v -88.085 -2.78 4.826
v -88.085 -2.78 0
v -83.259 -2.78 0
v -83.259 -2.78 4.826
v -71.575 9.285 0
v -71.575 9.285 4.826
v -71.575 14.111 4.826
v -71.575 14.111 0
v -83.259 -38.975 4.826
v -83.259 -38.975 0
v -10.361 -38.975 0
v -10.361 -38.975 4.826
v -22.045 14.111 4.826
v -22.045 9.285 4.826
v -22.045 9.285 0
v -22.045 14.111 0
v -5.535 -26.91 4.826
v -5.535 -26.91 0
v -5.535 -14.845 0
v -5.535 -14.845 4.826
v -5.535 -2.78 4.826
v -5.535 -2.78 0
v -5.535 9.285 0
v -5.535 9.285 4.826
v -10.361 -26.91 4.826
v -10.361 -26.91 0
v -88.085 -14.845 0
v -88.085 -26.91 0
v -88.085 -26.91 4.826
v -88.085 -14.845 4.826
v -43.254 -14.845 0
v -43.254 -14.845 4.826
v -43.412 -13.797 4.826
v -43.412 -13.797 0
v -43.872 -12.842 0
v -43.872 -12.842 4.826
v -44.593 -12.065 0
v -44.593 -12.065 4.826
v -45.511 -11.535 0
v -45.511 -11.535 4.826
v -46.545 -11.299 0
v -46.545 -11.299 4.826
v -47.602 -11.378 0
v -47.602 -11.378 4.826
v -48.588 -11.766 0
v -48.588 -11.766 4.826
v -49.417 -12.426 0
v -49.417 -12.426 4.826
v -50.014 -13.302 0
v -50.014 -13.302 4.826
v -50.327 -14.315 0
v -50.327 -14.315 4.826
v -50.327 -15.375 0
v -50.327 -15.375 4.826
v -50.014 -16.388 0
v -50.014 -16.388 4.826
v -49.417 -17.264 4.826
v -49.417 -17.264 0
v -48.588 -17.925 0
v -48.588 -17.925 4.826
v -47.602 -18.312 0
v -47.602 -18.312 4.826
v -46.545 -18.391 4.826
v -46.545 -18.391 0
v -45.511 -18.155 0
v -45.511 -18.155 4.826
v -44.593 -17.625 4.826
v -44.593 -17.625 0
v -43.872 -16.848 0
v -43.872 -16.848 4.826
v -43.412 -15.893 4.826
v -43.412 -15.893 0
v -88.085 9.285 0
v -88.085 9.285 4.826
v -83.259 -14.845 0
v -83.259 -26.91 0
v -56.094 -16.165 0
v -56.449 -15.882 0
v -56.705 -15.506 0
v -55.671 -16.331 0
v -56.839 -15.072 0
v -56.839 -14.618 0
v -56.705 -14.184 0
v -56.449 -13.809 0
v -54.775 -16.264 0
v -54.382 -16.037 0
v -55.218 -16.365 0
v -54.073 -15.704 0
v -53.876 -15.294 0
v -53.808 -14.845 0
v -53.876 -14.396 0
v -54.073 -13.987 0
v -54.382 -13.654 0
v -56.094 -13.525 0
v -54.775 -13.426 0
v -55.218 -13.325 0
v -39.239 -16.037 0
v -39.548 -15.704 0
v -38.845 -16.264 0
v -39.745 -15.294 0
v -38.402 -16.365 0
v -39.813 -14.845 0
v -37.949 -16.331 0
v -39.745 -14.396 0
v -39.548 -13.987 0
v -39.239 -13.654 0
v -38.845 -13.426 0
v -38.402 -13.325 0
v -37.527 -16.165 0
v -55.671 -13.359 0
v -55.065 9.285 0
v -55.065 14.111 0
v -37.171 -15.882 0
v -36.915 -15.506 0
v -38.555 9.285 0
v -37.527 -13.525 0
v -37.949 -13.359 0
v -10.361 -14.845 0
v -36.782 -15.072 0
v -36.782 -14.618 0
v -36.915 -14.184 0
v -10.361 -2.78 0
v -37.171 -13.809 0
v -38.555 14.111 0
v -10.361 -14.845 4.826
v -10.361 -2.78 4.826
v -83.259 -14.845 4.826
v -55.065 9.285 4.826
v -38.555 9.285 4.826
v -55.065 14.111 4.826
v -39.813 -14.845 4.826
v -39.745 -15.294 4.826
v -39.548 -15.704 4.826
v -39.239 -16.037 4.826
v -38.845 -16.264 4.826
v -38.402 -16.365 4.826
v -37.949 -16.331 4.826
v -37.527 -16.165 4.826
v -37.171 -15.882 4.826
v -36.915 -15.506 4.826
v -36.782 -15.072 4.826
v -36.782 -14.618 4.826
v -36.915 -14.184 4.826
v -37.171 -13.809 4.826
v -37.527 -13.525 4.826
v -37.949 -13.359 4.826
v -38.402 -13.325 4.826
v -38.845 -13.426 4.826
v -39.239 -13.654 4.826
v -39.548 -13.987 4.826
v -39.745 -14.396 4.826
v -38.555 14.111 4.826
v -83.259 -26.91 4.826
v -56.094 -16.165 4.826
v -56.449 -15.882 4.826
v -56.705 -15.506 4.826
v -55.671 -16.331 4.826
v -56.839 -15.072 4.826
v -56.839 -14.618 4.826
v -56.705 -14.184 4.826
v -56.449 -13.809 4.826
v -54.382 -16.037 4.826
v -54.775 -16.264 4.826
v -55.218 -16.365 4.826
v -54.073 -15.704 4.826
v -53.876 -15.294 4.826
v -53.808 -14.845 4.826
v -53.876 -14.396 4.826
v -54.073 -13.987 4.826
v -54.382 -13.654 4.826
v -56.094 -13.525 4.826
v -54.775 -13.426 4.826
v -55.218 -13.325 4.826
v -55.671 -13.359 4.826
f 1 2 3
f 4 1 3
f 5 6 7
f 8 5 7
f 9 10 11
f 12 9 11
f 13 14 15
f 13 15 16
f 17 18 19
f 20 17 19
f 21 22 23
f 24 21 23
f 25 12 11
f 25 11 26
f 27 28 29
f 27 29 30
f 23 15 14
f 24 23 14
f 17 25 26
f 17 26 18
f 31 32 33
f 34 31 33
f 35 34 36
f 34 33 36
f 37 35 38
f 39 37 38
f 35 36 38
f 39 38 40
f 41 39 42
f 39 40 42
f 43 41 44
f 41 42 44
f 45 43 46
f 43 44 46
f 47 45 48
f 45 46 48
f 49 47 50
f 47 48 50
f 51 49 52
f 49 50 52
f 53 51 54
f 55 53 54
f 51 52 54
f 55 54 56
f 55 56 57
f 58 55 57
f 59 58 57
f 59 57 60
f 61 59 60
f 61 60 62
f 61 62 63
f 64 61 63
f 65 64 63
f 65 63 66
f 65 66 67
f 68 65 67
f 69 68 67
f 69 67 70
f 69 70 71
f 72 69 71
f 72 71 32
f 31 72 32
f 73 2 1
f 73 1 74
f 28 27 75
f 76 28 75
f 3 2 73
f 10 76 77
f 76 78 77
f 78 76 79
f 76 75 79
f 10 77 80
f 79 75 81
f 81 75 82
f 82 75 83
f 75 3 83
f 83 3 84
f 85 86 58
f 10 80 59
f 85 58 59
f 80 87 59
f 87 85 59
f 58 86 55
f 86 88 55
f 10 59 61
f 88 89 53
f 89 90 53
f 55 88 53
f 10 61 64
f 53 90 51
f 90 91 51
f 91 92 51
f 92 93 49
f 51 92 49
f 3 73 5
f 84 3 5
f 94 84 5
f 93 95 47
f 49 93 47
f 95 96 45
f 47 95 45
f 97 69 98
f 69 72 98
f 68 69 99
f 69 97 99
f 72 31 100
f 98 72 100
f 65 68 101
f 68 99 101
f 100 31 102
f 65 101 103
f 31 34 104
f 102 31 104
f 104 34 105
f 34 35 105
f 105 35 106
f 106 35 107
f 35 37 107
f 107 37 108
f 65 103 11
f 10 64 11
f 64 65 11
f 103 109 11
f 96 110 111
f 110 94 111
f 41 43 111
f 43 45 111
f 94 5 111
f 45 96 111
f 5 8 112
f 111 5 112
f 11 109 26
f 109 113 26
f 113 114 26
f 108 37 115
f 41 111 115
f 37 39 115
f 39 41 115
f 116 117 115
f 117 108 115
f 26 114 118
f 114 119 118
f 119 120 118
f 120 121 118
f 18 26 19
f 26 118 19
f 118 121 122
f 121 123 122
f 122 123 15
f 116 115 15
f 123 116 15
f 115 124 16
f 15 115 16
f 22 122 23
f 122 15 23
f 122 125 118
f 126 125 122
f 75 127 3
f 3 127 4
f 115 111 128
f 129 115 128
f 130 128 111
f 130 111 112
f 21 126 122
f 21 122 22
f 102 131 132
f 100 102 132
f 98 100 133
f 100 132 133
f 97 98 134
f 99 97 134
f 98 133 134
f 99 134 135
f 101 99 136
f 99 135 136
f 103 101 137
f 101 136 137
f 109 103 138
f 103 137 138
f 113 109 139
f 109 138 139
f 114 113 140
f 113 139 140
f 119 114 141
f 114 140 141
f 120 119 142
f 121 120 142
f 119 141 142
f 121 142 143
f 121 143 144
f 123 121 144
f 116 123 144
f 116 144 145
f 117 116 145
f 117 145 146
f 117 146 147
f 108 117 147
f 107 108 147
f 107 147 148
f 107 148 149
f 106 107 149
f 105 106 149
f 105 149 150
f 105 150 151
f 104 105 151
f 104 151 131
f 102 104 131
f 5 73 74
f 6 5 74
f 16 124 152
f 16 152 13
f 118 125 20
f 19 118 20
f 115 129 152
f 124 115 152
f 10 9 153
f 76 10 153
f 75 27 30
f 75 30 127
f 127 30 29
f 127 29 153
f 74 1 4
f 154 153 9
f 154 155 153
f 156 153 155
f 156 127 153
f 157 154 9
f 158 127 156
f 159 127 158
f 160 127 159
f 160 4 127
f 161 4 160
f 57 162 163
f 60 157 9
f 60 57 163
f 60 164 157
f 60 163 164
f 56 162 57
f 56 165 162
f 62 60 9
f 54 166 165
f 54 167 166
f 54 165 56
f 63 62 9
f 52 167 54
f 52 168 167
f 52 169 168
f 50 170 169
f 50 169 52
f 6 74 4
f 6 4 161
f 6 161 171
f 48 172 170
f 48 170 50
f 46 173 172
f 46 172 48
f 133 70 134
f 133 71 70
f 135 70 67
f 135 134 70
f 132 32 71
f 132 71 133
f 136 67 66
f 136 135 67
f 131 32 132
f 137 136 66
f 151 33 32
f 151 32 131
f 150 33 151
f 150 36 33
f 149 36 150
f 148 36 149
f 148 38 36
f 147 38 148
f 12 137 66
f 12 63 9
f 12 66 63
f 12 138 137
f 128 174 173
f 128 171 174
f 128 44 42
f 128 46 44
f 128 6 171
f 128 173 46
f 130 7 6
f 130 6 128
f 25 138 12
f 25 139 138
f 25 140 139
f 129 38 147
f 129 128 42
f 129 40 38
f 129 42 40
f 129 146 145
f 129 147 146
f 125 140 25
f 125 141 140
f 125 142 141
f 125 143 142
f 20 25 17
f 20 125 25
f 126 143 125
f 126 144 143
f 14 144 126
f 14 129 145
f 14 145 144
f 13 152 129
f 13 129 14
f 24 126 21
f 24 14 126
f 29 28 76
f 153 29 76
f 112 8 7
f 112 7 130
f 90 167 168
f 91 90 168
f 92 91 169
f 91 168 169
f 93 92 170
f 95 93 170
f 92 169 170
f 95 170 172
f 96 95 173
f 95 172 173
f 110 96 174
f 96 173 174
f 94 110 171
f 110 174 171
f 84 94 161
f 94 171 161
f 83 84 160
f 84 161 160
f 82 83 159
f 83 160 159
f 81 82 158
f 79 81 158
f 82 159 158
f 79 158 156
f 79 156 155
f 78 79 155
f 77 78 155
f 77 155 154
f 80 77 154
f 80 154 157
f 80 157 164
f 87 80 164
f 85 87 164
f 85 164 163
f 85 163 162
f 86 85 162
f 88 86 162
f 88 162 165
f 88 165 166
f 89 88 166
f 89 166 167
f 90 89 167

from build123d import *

# Parameters (mm, degrees)
SKETCH1_W                = 82.55
SKETCH1_H                = 53.086
BOSS_EXTRUDE1_DEPTH      = 4.826
CUT_EXTRUDE1_START       = -88.085249325
CUT_EXTRUDE1_OUTLINE_W   = 4.826
CUT_EXTRUDE1_OUTLINE_H   = 4.826
CUT_EXTRUDE1_DEPTH       = 16.51
CUT_EXTRUDE1_START_2     = -55.065249325
CUT_EXTRUDE1_2_OUTLINE_W = 4.826
CUT_EXTRUDE1_2_OUTLINE_H = 4.826
CUT_EXTRUDE1_2_DEPTH     = 16.51
CUT_EXTRUDE1_START_3     = -22.045249325
CUT_EXTRUDE1_3_OUTLINE_W = 4.826
CUT_EXTRUDE1_3_OUTLINE_H = 4.826
CUT_EXTRUDE1_3_DEPTH     = 16.51
SKETCH3_W                = 4.826
SKETCH3_H                = 12.065
CUT_EXTRUDE2_DEPTH       = 97.443575108
SKETCH4_R                = 3.556
SKETCH4_R_2              = 1.524
CUT_EXTRUDE3_DEPTH       = 97.443575108


# Read off the part's stored shape, not the designer's step: Cut-Extrude1
with BuildPart() as part:
    # Sketch1 → Boss-Extrude1 (new body)
    with BuildSketch(Plane.XY):
        with Locations((-46.810249325, -12.432142782)):
            Rectangle(SKETCH1_W, SKETCH1_H)
    extrude(amount=BOSS_EXTRUDE1_DEPTH)

    # Cut-Extrude1 outline → Cut-Extrude1 (cut)
    with BuildSketch(Plane.YZ.offset(CUT_EXTRUDE1_START)):
        with Locations((11.697857218, 2.413)):
            Rectangle(CUT_EXTRUDE1_OUTLINE_W, CUT_EXTRUDE1_OUTLINE_H)
    extrude(amount=CUT_EXTRUDE1_DEPTH, mode=Mode.SUBTRACT)

    # Cut-Extrude1 2 outline → Cut-Extrude1 2 (cut)
    with BuildSketch(Plane.YZ.offset(CUT_EXTRUDE1_START_2)):
        with Locations((11.697857218, 2.413)):
            Rectangle(CUT_EXTRUDE1_2_OUTLINE_W, CUT_EXTRUDE1_2_OUTLINE_H)
    extrude(amount=CUT_EXTRUDE1_2_DEPTH, mode=Mode.SUBTRACT)

    # Cut-Extrude1 3 outline → Cut-Extrude1 3 (cut)
    with BuildSketch(Plane.YZ.offset(CUT_EXTRUDE1_START_3)):
        with Locations((11.697857218, 2.413)):
            Rectangle(CUT_EXTRUDE1_3_OUTLINE_W, CUT_EXTRUDE1_3_OUTLINE_H)
    extrude(amount=CUT_EXTRUDE1_3_DEPTH, mode=Mode.SUBTRACT)

    # Sketch3 → Cut-Extrude2 (cut, through all)
    with BuildSketch(Plane.XY.offset(4.826)):
        with Locations((-85.672249325, -32.942642782)):
            Rectangle(SKETCH3_W, SKETCH3_H)
        with Locations((-85.672249325, -8.812642782)):
            Rectangle(SKETCH3_W, SKETCH3_H)
        with Locations((-7.948249325, -32.942642782)):
            Rectangle(SKETCH3_W, SKETCH3_H)
        with Locations((-7.948249325, -8.812642782)):
            Rectangle(SKETCH3_W, SKETCH3_H)
    extrude(amount=-CUT_EXTRUDE2_DEPTH, mode=Mode.SUBTRACT)

    # Sketch4 → Cut-Extrude3 (cut, through all)
    with BuildSketch(Plane.XY.offset(4.826)):
        with Locations((-46.810249325, -14.845142782)):
            Circle(SKETCH4_R)
        with Locations((-55.331949325, -14.845142782)):
            Circle(SKETCH4_R_2)
        with Locations(Location((-38.288549325, -14.845142782, 0), (0, 0, 180))):
            Circle(SKETCH4_R_2)
    extrude(amount=-CUT_EXTRUDE3_DEPTH, mode=Mode.SUBTRACT)


solid = part.part
